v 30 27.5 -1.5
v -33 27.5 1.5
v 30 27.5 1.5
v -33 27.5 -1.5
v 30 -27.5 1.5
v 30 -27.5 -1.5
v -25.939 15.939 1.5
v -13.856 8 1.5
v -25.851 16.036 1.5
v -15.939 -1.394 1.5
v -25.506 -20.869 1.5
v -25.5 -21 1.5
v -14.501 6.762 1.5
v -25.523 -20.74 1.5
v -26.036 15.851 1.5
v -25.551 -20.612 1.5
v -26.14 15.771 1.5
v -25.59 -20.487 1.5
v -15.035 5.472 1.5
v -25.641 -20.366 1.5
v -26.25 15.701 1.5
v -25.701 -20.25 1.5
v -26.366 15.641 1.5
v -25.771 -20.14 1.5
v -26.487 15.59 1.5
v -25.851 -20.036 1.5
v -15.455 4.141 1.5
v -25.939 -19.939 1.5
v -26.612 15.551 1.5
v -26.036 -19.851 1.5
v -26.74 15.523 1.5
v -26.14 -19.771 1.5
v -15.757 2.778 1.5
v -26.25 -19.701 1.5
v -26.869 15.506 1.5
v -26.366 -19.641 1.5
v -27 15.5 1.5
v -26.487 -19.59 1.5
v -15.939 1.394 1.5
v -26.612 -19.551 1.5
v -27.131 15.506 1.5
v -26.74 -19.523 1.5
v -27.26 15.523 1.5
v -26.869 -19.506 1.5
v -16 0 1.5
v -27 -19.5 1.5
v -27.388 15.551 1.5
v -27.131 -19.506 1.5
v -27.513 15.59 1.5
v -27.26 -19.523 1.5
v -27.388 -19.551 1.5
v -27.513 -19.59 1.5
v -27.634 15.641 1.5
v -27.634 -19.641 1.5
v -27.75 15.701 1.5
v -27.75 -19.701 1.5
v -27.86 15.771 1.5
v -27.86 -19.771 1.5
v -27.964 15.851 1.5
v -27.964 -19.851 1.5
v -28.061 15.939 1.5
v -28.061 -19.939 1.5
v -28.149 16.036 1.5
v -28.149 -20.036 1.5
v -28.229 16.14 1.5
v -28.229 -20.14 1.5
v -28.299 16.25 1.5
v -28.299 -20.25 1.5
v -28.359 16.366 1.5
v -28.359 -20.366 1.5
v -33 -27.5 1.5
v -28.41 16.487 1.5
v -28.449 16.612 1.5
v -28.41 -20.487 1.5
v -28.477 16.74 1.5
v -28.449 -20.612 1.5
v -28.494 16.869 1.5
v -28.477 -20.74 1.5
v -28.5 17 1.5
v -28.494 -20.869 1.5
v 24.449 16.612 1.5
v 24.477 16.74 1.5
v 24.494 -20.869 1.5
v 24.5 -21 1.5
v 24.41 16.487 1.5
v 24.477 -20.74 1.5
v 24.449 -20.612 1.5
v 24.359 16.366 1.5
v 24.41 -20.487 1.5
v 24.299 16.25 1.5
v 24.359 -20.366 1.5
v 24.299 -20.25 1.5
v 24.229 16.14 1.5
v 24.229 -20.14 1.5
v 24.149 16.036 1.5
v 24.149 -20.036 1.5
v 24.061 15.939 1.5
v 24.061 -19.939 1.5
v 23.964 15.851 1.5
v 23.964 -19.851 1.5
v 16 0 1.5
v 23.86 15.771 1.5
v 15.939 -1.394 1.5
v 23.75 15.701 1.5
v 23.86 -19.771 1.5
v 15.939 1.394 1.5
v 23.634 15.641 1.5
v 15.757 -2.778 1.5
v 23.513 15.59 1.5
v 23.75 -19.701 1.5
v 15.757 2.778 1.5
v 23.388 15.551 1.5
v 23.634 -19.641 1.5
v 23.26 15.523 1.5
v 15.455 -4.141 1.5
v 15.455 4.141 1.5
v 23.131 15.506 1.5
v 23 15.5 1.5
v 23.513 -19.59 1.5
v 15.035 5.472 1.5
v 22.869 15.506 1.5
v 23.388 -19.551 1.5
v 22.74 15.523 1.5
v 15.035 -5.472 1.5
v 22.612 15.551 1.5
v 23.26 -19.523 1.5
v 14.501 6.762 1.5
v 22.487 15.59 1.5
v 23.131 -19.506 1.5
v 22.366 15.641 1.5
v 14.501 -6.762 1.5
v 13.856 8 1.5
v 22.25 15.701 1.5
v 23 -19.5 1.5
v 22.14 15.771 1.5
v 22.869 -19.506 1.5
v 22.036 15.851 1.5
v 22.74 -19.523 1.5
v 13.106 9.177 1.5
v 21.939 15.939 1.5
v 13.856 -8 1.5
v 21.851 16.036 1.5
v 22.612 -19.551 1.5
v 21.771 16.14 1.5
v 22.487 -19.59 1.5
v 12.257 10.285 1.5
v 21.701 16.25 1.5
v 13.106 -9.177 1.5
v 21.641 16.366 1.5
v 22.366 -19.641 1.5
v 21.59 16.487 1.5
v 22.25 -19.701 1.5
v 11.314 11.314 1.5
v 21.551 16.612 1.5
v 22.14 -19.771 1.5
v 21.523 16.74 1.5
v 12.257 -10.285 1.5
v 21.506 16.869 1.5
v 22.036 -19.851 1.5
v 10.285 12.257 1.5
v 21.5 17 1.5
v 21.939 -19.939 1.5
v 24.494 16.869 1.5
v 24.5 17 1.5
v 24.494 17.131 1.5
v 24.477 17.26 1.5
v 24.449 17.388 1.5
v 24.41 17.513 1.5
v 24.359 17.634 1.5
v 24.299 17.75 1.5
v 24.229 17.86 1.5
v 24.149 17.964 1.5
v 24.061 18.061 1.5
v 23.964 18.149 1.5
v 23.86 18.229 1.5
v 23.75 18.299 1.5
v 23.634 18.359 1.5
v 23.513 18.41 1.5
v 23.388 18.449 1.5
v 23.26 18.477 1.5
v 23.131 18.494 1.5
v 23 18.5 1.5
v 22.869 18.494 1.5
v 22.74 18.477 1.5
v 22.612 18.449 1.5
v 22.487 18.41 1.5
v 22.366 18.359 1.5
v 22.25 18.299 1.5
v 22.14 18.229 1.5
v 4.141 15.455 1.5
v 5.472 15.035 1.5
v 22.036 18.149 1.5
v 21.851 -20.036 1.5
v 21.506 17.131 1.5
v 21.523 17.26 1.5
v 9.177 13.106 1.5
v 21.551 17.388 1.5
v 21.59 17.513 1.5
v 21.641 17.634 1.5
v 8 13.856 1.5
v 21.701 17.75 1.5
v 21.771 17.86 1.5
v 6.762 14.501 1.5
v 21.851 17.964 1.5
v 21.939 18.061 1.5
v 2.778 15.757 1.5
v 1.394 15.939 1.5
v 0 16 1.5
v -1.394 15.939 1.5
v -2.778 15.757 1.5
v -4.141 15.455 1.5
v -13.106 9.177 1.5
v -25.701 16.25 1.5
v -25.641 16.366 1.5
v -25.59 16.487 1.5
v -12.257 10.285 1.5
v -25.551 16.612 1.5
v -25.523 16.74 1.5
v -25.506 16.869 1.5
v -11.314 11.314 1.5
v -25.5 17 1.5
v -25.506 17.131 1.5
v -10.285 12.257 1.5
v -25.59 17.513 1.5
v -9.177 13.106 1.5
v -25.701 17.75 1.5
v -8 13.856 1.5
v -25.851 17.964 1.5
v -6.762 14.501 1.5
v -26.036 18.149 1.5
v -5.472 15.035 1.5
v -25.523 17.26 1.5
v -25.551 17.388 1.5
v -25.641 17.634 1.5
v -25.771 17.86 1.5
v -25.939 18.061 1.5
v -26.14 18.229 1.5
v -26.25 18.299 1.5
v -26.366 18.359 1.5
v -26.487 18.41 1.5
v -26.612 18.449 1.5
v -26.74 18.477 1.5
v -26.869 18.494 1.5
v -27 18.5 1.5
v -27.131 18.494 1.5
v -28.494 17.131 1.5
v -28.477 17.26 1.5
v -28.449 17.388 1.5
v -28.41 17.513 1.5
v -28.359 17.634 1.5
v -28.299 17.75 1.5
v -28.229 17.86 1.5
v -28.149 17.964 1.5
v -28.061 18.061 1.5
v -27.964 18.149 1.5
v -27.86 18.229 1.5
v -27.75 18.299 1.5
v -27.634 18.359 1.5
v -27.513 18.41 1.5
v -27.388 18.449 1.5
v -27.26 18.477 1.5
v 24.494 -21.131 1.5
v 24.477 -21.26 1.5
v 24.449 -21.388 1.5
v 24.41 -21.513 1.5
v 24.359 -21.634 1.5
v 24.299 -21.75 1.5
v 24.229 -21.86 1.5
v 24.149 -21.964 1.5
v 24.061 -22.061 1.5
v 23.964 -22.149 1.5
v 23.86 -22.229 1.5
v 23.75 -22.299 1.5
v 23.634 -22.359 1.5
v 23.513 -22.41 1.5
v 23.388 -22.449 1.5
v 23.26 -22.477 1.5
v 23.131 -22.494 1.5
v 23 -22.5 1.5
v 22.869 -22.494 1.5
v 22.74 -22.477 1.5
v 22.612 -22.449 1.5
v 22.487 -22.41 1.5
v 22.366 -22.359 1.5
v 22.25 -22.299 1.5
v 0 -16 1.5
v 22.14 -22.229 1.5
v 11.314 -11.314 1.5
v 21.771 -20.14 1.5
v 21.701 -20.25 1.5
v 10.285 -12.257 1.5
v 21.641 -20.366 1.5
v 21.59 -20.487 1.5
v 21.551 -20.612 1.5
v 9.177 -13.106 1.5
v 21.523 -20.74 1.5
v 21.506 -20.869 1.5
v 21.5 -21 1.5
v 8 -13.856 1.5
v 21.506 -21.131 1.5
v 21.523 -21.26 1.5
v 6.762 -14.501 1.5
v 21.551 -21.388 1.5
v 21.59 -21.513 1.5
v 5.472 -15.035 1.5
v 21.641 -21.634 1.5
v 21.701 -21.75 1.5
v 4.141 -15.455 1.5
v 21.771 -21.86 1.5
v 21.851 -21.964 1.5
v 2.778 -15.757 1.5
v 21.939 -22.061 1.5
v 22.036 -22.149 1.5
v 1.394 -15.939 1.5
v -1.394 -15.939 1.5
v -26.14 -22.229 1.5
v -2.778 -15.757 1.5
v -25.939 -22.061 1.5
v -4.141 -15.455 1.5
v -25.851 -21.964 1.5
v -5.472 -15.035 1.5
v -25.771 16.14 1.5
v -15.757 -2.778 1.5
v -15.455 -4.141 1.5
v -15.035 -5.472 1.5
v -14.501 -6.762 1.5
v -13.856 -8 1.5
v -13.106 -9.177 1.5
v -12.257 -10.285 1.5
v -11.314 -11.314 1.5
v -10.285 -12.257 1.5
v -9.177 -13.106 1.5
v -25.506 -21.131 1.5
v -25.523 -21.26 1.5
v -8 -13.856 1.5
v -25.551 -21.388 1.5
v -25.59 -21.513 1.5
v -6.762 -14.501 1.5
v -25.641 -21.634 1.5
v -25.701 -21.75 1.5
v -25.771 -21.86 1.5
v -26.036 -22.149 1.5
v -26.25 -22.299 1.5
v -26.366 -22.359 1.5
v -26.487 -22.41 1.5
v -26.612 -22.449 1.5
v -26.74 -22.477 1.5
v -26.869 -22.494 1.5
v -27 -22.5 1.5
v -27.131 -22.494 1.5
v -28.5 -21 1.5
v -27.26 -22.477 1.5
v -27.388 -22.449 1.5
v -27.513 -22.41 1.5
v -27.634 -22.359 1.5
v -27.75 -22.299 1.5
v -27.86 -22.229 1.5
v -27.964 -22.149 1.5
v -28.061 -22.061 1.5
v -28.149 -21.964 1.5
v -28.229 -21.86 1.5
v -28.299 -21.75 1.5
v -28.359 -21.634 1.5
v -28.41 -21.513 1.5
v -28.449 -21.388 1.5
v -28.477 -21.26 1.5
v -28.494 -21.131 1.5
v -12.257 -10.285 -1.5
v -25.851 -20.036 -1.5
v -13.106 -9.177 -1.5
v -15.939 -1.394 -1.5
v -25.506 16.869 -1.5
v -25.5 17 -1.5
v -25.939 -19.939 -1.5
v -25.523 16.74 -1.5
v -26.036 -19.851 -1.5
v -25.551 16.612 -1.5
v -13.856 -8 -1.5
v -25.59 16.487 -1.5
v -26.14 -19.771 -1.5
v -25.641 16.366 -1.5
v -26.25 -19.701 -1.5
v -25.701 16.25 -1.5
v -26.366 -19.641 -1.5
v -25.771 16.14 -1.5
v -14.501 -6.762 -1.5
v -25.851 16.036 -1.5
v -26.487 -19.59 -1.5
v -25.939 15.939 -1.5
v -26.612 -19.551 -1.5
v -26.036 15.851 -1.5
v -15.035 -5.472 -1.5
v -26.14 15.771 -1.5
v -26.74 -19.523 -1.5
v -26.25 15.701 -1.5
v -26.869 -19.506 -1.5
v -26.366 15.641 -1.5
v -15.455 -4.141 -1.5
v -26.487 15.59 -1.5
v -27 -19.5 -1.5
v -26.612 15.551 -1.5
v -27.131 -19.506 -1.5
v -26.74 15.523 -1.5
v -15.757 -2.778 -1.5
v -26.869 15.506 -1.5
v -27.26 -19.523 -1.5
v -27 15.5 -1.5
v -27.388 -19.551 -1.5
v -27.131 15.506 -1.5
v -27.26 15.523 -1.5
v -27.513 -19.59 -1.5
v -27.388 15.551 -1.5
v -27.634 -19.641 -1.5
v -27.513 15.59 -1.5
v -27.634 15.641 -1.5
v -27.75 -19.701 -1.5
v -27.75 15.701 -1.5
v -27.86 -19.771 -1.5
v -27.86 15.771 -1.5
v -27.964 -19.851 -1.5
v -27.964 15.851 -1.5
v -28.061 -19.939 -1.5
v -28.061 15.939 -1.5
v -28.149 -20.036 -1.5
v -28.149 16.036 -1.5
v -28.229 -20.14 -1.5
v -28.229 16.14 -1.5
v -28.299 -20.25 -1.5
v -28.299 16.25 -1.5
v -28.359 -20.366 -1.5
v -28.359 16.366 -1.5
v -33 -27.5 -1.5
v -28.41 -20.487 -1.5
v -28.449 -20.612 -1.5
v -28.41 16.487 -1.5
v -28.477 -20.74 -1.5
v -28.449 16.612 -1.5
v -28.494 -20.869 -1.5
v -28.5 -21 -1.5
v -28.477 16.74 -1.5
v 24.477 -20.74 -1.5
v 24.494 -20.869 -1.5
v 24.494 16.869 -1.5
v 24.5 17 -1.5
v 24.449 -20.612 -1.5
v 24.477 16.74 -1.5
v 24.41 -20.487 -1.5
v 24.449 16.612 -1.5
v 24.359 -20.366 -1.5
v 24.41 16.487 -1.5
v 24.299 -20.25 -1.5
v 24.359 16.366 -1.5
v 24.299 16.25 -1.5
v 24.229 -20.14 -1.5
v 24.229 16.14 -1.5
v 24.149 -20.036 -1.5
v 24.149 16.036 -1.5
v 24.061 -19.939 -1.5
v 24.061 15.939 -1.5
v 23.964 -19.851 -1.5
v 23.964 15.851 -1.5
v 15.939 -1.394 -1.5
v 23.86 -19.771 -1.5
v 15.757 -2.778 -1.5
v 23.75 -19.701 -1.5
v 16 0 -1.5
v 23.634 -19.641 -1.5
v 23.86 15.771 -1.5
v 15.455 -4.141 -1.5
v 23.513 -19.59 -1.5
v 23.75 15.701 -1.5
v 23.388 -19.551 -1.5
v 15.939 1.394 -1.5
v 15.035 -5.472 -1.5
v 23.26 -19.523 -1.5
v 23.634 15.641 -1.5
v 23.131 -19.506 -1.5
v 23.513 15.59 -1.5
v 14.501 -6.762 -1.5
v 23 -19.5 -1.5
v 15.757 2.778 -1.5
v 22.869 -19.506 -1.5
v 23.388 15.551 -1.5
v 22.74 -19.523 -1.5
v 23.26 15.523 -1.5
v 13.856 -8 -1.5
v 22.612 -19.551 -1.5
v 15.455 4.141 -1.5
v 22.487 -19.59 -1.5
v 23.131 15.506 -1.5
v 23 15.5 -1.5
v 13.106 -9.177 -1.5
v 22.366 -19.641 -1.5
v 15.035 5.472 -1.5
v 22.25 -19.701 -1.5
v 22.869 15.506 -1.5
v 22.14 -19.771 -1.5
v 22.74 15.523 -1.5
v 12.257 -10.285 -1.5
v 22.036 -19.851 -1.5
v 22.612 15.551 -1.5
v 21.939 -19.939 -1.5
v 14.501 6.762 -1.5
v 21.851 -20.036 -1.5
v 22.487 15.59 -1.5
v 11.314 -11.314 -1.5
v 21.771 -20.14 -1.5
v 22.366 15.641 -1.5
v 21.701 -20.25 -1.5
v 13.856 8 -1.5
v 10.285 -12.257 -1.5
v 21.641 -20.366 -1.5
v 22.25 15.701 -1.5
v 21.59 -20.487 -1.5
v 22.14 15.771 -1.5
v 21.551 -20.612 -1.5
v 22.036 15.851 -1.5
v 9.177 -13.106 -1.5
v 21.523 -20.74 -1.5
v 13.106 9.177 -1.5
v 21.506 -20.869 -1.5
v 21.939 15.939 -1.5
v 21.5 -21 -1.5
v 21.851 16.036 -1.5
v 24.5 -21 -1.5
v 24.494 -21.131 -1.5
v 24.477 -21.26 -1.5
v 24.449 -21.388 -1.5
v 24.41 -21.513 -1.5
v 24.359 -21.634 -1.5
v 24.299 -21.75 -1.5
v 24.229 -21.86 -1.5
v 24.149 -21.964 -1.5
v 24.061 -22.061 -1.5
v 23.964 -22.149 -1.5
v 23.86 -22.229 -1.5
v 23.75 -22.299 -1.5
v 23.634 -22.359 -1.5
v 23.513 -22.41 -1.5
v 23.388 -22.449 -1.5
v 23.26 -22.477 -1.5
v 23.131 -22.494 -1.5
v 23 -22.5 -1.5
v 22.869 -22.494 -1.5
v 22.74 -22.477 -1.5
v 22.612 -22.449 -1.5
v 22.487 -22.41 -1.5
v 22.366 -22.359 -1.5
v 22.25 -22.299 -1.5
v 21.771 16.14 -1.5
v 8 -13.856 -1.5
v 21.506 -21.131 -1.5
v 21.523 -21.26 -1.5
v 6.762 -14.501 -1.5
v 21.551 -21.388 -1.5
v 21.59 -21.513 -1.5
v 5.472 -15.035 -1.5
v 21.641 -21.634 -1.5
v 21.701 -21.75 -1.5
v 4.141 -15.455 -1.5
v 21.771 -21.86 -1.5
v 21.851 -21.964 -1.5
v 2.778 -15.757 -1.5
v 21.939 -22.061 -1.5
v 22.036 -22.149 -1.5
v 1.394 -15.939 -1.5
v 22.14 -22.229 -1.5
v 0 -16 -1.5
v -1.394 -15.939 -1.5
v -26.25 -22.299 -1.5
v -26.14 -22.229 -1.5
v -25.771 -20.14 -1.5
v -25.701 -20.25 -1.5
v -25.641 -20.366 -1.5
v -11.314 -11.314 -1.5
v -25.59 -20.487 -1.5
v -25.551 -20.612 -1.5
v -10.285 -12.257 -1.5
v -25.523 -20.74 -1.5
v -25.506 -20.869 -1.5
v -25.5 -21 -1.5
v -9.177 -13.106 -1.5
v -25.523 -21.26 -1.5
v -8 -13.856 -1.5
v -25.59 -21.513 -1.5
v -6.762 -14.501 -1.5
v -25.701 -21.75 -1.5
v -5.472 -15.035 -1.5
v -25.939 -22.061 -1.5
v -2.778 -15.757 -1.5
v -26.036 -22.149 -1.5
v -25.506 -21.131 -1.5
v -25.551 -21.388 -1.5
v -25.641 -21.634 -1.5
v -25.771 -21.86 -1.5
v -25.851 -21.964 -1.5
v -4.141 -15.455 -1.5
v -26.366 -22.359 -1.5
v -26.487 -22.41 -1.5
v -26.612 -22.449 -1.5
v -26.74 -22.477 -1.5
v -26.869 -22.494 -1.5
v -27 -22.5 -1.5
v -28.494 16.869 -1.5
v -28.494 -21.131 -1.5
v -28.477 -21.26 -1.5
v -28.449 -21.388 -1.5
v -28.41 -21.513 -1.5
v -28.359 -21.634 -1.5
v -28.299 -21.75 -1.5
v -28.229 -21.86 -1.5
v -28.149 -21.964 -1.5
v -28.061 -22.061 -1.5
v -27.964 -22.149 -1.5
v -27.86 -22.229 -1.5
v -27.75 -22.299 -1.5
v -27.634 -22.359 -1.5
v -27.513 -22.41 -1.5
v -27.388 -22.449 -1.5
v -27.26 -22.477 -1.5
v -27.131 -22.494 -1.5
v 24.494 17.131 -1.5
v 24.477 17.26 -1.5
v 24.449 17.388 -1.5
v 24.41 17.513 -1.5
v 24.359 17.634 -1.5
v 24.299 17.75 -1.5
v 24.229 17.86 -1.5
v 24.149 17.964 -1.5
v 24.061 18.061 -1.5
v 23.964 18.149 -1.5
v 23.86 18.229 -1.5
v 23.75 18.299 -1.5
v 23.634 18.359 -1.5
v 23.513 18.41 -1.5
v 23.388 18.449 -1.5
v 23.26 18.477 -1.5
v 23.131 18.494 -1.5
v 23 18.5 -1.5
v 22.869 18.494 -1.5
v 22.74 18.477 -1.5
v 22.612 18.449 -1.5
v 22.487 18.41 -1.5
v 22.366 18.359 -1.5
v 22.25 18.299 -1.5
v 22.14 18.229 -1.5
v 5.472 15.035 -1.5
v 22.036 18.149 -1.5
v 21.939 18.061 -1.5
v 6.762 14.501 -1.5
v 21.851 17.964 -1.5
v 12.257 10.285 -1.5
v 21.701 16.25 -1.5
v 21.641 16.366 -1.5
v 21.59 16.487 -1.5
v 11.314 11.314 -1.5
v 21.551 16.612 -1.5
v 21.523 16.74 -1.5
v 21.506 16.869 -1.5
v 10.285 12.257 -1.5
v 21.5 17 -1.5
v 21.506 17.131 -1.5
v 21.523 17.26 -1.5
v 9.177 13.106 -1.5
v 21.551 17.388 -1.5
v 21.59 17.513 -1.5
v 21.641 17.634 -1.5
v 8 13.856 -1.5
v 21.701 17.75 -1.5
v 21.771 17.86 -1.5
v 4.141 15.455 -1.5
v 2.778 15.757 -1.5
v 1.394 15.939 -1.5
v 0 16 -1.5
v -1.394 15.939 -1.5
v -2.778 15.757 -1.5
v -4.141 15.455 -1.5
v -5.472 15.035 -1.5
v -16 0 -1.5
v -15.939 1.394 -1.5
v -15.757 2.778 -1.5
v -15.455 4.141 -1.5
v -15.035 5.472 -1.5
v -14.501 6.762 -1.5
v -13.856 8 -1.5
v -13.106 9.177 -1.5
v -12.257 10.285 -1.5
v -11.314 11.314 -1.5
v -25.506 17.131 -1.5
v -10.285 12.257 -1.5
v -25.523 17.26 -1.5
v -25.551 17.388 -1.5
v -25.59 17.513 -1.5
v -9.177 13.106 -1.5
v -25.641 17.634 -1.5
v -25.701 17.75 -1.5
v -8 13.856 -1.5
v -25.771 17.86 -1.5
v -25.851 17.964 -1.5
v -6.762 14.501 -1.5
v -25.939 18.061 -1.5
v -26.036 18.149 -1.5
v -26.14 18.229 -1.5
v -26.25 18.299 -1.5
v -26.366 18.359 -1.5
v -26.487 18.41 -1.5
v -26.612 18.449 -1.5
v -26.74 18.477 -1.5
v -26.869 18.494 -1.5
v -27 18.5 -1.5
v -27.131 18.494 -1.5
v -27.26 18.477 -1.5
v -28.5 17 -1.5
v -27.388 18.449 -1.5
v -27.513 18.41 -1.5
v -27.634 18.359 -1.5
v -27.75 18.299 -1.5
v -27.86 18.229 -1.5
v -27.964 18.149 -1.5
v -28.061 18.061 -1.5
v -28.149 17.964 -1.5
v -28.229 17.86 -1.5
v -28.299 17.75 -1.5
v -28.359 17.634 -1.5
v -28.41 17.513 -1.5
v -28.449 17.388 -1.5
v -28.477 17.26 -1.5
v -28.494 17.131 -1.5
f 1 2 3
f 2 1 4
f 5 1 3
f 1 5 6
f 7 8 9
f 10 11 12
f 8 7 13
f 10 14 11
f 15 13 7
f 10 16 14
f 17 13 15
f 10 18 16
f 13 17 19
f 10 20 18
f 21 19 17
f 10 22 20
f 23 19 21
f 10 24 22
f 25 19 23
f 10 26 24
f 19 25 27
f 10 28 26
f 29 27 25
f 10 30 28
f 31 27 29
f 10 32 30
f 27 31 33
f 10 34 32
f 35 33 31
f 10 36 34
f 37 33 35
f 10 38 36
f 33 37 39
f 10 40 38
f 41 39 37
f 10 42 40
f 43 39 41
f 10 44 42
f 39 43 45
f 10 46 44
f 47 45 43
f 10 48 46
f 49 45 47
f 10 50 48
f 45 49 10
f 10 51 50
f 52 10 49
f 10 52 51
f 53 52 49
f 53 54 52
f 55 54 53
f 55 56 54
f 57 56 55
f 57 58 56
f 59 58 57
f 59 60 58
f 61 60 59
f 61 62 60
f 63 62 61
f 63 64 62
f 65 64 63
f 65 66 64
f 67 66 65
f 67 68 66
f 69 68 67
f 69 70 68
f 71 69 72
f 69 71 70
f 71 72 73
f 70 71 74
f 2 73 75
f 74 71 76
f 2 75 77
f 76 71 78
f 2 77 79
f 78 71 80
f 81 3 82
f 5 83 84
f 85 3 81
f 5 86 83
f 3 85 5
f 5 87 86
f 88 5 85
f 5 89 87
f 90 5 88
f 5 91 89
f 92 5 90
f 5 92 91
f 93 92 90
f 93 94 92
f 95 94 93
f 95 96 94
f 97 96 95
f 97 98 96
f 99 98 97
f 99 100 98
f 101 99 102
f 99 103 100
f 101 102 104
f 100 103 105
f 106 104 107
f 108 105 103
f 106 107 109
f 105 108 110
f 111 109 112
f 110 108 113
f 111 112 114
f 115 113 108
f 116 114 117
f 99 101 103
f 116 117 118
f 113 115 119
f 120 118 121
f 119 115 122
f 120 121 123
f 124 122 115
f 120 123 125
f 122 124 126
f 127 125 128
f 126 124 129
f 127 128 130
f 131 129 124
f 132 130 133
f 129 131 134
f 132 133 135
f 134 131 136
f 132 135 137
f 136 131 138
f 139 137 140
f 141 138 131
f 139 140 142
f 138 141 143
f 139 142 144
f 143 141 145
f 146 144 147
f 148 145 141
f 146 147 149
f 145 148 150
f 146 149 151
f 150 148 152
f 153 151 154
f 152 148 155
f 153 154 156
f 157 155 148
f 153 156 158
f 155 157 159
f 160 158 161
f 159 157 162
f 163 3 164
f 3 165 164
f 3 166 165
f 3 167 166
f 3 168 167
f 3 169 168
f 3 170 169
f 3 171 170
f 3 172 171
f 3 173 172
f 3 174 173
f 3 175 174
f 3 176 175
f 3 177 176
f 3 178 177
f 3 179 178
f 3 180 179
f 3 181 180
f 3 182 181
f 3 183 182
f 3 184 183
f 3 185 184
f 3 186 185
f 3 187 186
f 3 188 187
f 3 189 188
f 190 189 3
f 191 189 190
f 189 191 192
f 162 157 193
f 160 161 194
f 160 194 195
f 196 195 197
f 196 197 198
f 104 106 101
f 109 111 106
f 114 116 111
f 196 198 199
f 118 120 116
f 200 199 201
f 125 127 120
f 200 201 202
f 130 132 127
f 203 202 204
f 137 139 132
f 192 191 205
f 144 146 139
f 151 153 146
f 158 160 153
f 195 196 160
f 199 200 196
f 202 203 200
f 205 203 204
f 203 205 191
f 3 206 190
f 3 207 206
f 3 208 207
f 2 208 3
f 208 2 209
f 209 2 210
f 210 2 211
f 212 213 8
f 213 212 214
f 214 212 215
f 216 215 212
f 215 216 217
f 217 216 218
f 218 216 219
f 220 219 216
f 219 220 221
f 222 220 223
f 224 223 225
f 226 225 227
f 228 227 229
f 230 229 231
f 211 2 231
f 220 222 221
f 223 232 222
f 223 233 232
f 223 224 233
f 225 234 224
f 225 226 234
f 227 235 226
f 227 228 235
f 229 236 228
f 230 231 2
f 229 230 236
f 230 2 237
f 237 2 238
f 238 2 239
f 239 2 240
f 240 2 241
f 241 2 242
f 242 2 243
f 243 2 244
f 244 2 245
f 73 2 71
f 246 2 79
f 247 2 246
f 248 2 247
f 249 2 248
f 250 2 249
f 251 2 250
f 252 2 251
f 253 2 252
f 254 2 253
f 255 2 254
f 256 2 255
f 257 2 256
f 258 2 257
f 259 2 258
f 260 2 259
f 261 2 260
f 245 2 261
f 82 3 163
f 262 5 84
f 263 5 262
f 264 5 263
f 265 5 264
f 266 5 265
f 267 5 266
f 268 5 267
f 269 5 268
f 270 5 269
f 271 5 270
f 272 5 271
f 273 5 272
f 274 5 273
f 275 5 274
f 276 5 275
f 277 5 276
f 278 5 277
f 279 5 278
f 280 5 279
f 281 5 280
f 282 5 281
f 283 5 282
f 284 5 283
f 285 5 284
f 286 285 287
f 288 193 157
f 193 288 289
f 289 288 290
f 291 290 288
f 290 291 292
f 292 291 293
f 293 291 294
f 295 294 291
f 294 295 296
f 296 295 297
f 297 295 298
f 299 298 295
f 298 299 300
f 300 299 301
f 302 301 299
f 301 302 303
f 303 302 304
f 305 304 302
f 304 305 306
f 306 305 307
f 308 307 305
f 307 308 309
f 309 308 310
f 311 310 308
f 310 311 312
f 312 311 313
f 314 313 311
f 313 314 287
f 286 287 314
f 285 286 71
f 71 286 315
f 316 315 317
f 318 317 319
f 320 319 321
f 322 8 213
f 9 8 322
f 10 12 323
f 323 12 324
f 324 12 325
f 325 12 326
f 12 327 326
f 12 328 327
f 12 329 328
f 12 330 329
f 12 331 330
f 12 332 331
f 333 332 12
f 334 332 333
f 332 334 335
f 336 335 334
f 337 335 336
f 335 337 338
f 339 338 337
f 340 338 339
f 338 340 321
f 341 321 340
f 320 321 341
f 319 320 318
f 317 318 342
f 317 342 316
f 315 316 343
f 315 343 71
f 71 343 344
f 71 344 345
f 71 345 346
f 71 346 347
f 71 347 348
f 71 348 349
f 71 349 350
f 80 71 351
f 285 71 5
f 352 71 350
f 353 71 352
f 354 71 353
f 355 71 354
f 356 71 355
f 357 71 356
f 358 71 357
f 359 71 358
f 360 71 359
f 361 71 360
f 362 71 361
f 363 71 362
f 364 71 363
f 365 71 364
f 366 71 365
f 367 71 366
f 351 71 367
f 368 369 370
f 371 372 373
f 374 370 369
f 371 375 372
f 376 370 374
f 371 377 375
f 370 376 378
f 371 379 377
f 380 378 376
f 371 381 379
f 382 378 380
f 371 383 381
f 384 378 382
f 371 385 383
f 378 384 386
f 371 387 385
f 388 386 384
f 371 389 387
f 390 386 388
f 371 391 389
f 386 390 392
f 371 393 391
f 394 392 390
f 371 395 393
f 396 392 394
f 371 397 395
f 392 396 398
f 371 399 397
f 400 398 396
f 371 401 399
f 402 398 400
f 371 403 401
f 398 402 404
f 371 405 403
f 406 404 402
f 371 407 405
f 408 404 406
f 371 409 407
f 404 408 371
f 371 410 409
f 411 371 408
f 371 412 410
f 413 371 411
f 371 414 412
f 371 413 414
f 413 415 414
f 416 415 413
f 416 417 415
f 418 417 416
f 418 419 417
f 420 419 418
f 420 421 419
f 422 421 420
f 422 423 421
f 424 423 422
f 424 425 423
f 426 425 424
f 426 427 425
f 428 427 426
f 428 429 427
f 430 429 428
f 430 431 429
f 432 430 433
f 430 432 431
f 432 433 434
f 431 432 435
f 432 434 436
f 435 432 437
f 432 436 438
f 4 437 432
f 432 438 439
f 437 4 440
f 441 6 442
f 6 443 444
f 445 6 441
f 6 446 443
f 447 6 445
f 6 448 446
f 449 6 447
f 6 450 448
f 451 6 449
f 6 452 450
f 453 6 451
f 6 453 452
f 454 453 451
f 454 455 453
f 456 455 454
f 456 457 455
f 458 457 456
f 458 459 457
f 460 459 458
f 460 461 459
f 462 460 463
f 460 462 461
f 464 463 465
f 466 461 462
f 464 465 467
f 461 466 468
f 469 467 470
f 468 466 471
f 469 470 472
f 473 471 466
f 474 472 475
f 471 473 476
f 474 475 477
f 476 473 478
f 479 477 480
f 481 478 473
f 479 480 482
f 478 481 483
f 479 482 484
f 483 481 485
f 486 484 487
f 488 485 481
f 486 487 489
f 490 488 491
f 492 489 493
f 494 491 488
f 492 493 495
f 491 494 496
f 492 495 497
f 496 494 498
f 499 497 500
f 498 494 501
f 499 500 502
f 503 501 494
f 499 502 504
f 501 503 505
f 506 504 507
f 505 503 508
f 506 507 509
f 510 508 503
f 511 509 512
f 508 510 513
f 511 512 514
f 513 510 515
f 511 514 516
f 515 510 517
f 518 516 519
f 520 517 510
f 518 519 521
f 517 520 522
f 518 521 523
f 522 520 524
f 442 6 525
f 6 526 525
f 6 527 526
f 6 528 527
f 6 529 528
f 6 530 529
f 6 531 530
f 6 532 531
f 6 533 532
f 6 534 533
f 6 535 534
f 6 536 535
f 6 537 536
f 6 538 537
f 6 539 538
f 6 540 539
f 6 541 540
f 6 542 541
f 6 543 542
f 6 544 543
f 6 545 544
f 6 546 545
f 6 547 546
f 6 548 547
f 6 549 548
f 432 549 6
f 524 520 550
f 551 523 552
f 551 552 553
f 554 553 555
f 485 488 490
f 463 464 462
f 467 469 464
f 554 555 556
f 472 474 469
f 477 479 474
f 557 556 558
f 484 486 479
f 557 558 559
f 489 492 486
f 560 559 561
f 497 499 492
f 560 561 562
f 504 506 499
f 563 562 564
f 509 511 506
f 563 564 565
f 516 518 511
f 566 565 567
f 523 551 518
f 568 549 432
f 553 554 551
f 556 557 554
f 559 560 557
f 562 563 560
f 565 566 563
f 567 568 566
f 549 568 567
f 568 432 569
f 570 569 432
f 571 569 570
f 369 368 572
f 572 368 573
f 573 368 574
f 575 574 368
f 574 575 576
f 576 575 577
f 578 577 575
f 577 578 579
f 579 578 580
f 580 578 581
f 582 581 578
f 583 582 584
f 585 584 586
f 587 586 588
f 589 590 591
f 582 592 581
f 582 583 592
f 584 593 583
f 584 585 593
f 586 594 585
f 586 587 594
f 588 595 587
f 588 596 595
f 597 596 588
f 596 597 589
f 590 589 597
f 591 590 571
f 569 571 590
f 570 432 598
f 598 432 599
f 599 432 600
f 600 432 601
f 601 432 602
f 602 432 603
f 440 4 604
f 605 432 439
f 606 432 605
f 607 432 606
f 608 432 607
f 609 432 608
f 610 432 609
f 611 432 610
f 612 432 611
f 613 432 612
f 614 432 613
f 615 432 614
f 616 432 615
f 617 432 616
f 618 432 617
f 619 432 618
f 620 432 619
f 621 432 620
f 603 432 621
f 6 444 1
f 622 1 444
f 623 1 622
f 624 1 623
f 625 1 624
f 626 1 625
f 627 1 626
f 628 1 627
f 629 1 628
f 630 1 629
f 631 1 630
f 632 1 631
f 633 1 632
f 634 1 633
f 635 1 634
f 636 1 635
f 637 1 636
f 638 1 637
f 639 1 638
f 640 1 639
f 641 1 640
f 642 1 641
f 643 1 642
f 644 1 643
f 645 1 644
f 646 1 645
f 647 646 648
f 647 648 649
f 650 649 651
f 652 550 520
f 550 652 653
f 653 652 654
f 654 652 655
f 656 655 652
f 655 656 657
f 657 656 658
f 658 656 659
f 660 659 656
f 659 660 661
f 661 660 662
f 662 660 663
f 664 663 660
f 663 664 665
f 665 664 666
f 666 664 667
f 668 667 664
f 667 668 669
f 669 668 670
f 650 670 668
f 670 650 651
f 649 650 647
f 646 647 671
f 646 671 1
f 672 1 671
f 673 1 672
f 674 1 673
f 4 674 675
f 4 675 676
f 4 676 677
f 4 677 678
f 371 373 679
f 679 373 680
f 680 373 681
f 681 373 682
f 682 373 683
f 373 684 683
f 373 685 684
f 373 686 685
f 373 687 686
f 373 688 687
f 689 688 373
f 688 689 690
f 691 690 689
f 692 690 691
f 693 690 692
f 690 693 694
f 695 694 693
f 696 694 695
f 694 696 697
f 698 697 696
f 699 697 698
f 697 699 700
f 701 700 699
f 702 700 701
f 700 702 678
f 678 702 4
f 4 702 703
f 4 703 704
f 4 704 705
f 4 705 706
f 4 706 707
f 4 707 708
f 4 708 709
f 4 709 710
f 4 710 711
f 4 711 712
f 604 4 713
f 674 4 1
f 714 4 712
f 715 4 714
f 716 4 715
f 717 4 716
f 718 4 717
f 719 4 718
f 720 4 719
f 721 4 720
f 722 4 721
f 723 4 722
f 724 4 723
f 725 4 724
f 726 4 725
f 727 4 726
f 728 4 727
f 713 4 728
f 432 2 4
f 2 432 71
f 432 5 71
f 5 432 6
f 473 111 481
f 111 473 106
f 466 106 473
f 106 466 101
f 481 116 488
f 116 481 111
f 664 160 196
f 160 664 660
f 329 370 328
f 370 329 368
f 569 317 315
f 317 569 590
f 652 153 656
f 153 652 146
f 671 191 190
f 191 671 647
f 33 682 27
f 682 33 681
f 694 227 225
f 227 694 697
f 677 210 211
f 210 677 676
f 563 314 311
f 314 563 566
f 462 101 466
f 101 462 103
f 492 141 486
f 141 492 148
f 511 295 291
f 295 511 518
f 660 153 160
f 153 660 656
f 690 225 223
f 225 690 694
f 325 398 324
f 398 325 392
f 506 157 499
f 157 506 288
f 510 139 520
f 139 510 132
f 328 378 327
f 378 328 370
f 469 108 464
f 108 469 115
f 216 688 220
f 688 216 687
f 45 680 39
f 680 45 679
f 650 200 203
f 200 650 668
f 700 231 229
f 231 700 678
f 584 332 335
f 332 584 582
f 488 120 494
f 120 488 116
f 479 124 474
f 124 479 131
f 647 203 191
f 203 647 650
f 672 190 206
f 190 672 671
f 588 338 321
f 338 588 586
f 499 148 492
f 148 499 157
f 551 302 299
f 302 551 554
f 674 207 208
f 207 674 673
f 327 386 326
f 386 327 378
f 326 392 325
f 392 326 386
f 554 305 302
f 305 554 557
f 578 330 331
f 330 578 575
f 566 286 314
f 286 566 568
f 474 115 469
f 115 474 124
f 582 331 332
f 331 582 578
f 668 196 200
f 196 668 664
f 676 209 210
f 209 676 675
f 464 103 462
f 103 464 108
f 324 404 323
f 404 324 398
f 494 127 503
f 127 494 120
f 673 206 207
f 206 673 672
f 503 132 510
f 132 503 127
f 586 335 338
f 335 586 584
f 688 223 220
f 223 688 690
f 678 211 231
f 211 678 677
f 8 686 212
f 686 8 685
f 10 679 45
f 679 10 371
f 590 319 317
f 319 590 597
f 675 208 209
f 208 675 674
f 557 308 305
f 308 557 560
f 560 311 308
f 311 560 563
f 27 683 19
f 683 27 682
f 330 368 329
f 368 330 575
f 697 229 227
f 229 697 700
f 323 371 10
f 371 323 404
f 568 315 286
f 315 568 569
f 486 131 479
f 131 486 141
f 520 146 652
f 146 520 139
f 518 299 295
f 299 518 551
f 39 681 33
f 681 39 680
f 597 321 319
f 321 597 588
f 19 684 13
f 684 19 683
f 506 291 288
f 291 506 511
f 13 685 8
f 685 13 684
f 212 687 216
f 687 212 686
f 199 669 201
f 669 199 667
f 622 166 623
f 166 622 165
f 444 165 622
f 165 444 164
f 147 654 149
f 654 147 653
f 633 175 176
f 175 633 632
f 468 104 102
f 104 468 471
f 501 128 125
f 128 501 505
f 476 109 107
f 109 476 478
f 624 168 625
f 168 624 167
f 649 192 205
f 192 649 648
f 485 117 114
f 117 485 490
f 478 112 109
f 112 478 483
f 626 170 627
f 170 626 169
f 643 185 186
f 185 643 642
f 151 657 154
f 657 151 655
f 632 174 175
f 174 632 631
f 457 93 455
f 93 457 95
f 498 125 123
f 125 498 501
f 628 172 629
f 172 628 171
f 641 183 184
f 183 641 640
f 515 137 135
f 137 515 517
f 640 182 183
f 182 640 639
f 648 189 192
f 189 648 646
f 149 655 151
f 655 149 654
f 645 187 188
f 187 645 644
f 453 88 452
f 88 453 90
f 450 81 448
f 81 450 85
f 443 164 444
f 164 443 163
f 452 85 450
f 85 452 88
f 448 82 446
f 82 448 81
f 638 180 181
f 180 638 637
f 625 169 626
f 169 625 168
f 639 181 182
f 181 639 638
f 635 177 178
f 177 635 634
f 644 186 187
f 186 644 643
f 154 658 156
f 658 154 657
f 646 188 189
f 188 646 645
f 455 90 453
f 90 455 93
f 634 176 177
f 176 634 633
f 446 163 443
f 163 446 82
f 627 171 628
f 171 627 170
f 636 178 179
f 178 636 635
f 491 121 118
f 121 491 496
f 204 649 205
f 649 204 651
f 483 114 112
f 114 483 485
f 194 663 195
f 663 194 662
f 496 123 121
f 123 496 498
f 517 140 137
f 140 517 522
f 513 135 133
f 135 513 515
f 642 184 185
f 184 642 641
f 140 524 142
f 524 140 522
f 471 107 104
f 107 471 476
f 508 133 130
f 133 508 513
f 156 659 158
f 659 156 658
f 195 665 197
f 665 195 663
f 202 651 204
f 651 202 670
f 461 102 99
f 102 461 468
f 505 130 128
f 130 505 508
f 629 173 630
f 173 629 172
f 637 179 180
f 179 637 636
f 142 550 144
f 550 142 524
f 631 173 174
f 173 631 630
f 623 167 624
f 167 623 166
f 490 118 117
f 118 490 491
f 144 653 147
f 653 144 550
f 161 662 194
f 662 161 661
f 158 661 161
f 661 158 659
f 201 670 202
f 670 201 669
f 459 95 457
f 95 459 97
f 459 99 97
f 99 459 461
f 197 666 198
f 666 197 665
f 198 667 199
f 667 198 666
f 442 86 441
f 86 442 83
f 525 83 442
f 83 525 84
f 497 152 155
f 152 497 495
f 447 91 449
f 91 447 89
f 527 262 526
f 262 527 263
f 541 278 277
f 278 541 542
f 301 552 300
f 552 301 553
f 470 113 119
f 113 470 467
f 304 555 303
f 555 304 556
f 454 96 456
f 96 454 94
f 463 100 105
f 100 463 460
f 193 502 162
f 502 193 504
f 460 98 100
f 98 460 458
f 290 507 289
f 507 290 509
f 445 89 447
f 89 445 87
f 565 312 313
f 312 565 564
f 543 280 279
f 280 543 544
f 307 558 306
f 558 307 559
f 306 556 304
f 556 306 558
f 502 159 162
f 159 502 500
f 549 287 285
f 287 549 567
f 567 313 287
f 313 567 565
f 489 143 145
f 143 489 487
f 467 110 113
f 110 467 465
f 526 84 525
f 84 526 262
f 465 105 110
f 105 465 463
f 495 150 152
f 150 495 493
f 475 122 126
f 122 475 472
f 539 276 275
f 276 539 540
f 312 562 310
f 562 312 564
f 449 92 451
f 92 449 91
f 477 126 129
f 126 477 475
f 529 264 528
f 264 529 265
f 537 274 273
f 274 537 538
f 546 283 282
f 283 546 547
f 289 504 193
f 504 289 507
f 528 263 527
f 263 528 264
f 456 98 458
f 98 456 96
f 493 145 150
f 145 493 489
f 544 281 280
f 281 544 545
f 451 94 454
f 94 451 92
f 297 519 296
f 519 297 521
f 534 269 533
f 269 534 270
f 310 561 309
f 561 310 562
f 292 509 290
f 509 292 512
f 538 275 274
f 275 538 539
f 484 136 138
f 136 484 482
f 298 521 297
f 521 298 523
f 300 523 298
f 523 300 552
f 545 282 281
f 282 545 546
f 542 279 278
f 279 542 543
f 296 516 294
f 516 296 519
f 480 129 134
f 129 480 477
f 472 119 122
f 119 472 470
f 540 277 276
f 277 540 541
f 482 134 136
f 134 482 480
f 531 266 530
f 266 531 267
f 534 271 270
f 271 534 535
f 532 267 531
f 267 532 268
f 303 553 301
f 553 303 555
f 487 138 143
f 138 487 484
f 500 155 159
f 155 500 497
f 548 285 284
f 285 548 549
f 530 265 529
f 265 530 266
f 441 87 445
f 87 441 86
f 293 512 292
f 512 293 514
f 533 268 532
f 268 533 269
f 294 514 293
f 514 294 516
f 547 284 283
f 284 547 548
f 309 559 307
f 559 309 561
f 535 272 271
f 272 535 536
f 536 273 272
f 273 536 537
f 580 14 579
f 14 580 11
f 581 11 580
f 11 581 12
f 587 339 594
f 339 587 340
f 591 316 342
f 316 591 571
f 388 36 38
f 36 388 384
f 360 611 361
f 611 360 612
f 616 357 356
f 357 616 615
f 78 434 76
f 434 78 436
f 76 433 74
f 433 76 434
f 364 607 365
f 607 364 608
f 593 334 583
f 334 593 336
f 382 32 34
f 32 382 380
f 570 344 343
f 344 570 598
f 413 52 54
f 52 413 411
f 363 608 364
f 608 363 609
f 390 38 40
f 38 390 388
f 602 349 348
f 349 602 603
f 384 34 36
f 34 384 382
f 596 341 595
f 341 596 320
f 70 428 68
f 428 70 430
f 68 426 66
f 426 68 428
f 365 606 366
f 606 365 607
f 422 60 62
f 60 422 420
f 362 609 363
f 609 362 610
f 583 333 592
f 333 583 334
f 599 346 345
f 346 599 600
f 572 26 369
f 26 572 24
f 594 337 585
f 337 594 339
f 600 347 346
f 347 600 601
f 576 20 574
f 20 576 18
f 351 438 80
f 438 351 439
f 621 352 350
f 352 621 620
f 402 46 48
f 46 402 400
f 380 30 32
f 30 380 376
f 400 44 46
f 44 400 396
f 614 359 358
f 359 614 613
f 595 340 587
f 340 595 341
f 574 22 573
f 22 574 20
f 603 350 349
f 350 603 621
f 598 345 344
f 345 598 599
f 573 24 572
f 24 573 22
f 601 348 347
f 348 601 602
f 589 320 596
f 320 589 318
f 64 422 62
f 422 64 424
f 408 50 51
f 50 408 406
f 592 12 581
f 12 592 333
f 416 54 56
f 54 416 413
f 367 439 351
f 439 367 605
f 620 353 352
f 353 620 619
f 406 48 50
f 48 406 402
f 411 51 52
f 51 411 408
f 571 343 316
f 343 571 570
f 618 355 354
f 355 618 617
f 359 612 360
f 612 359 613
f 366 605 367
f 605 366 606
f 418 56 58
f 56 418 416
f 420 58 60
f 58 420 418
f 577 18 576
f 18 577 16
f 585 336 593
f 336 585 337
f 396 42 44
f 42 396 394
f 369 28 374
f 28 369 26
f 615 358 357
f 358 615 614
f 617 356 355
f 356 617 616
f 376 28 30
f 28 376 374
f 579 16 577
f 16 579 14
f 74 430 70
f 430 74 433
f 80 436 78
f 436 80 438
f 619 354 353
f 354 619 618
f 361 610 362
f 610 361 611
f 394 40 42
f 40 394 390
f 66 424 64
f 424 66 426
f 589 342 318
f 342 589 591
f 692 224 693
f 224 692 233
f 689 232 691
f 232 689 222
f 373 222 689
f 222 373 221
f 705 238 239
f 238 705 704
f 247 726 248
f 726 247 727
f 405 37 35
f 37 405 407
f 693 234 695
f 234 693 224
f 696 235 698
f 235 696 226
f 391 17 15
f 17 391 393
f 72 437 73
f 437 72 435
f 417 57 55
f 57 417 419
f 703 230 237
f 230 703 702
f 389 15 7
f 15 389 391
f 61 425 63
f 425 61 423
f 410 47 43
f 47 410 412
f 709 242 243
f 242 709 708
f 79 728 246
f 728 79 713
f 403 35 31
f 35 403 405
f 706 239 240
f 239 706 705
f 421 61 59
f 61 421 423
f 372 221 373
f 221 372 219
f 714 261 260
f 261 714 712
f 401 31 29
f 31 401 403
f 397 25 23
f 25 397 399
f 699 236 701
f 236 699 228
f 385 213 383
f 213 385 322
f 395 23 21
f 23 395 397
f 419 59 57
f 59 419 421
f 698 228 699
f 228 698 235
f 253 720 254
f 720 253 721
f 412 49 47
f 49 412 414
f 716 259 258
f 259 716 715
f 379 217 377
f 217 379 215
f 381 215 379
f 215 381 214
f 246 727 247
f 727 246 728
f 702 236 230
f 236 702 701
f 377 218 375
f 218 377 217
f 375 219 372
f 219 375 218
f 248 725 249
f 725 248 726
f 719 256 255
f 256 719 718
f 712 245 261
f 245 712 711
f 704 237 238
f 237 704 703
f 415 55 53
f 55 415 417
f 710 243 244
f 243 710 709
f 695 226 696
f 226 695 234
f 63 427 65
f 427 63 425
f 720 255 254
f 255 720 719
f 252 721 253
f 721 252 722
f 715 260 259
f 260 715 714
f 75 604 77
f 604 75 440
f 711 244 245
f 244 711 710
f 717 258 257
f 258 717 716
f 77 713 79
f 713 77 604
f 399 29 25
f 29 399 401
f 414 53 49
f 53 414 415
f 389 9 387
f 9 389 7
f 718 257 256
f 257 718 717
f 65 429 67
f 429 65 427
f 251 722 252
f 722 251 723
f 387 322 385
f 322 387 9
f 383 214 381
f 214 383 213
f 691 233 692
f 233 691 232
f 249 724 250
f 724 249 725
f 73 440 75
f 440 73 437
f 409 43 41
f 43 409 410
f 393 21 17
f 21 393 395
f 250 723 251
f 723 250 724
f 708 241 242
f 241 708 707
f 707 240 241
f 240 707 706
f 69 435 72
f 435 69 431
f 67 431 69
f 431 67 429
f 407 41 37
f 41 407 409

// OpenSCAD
// file: ../../../references/pan-tilt-1941574/scad-rev/tiltservomount_std.scad
//tilt servo holder and plate for std servo
// HK=hobby king 15269 servo

$fn=72;

difference(){
union(){   
//baseplate    
translate([-1.5,0,0])cube([63,55,3], center=true);  
//servo mounts    
translate([24,-6,20/2])cube([10,12,21], center=true);  
translate([-27,-6,11/2])cube([10,12,11], center=true);  
translate([19,9.5,1])rotate([0,0,-90])wsupport(10,10);  
translate([-32,9.5,1])rotate([0,0,-90])wsupport(10,10);   
//shaft holder pillow block  
translate([-11.8,24.5,11])rotate([90,0,0]) cylinder(r = 6, h = 6, center=true);
translate([-11.8,24.5,5])rotate([90,0,0]) cube([12,12,6], center=true);
translate([-30,23.50-2,1])rotate([0,0,0])wsupport(15,6);   
translate([10-6+2.5,27.5,1])rotate([0,0,-180])wsupport(15,6);  
     
} 
union(){
//hole for servo mounts    
translate([23,-7.5,16.5])rotate([90,0,0]) cylinder(r = 1.2, h = 55, center=true);
translate([23,-7.5,6.5])rotate([90,0,0]) cylinder(r = 1.2, h = 55, center=true);
translate([-26,-7.5,16.5])rotate([90,0,0]) cylinder(r = 1.2, h = 55, center=true);
translate([-26,-7.5,6.5])rotate([90,0,0]) cylinder(r = 1.2, h = 55, center=true);
// shaft hole in pillow block
translate([-11.8,0,11])rotate([90,0,0]) cylinder(r = 3.2, h = 56, center=true);  
// circule cutout in baseplate   
cylinder(r = 16, h = 6, center=true);   // circule cutout
// corner mounting holes on base plate    
translate([60/2-7,54/2-10,0])cylinder(h=4,r=3/2,center=true);
translate([60/2-7,-54/2+6,0])cylinder(h=4,r=3/2,center=true);  
translate([-54/2,-54/2+6,0])cylinder(h=4,r=3/2,center=true); 
translate([-54/2,+54/2-10,0])cylinder(h=4,r=3/2,center=true);    
}
}

module wsupport(x,y){
    difference(){
        cube([x,y,x]);
        rotate([0,-45,0]) cube([x*1.7,y,x*1.7]);
    }
}    
// main file
// Partition of micromet's original SCAD, Thingiverse 1941574 (CC BY-SA).
// No scaling, remodeling or hole changes. Ribs stay with their mounting groups.
piece = 0;
regions = [
    [[-40,-35,-1.5],[80,70,3]],
    [[18,-13,1.5],[12,23,25]],
    [[-33,-13,1.5],[12,23,25]],
    [[-40,10,1.5],[80,25,25]]
];
module original() {
    include <../../../references/pan-tilt-1941574/scad-rev/tiltservomount_std.scad>
}
intersection() {
    original();
    translate(regions[piece][0]) cube(regions[piece][1]);
}
